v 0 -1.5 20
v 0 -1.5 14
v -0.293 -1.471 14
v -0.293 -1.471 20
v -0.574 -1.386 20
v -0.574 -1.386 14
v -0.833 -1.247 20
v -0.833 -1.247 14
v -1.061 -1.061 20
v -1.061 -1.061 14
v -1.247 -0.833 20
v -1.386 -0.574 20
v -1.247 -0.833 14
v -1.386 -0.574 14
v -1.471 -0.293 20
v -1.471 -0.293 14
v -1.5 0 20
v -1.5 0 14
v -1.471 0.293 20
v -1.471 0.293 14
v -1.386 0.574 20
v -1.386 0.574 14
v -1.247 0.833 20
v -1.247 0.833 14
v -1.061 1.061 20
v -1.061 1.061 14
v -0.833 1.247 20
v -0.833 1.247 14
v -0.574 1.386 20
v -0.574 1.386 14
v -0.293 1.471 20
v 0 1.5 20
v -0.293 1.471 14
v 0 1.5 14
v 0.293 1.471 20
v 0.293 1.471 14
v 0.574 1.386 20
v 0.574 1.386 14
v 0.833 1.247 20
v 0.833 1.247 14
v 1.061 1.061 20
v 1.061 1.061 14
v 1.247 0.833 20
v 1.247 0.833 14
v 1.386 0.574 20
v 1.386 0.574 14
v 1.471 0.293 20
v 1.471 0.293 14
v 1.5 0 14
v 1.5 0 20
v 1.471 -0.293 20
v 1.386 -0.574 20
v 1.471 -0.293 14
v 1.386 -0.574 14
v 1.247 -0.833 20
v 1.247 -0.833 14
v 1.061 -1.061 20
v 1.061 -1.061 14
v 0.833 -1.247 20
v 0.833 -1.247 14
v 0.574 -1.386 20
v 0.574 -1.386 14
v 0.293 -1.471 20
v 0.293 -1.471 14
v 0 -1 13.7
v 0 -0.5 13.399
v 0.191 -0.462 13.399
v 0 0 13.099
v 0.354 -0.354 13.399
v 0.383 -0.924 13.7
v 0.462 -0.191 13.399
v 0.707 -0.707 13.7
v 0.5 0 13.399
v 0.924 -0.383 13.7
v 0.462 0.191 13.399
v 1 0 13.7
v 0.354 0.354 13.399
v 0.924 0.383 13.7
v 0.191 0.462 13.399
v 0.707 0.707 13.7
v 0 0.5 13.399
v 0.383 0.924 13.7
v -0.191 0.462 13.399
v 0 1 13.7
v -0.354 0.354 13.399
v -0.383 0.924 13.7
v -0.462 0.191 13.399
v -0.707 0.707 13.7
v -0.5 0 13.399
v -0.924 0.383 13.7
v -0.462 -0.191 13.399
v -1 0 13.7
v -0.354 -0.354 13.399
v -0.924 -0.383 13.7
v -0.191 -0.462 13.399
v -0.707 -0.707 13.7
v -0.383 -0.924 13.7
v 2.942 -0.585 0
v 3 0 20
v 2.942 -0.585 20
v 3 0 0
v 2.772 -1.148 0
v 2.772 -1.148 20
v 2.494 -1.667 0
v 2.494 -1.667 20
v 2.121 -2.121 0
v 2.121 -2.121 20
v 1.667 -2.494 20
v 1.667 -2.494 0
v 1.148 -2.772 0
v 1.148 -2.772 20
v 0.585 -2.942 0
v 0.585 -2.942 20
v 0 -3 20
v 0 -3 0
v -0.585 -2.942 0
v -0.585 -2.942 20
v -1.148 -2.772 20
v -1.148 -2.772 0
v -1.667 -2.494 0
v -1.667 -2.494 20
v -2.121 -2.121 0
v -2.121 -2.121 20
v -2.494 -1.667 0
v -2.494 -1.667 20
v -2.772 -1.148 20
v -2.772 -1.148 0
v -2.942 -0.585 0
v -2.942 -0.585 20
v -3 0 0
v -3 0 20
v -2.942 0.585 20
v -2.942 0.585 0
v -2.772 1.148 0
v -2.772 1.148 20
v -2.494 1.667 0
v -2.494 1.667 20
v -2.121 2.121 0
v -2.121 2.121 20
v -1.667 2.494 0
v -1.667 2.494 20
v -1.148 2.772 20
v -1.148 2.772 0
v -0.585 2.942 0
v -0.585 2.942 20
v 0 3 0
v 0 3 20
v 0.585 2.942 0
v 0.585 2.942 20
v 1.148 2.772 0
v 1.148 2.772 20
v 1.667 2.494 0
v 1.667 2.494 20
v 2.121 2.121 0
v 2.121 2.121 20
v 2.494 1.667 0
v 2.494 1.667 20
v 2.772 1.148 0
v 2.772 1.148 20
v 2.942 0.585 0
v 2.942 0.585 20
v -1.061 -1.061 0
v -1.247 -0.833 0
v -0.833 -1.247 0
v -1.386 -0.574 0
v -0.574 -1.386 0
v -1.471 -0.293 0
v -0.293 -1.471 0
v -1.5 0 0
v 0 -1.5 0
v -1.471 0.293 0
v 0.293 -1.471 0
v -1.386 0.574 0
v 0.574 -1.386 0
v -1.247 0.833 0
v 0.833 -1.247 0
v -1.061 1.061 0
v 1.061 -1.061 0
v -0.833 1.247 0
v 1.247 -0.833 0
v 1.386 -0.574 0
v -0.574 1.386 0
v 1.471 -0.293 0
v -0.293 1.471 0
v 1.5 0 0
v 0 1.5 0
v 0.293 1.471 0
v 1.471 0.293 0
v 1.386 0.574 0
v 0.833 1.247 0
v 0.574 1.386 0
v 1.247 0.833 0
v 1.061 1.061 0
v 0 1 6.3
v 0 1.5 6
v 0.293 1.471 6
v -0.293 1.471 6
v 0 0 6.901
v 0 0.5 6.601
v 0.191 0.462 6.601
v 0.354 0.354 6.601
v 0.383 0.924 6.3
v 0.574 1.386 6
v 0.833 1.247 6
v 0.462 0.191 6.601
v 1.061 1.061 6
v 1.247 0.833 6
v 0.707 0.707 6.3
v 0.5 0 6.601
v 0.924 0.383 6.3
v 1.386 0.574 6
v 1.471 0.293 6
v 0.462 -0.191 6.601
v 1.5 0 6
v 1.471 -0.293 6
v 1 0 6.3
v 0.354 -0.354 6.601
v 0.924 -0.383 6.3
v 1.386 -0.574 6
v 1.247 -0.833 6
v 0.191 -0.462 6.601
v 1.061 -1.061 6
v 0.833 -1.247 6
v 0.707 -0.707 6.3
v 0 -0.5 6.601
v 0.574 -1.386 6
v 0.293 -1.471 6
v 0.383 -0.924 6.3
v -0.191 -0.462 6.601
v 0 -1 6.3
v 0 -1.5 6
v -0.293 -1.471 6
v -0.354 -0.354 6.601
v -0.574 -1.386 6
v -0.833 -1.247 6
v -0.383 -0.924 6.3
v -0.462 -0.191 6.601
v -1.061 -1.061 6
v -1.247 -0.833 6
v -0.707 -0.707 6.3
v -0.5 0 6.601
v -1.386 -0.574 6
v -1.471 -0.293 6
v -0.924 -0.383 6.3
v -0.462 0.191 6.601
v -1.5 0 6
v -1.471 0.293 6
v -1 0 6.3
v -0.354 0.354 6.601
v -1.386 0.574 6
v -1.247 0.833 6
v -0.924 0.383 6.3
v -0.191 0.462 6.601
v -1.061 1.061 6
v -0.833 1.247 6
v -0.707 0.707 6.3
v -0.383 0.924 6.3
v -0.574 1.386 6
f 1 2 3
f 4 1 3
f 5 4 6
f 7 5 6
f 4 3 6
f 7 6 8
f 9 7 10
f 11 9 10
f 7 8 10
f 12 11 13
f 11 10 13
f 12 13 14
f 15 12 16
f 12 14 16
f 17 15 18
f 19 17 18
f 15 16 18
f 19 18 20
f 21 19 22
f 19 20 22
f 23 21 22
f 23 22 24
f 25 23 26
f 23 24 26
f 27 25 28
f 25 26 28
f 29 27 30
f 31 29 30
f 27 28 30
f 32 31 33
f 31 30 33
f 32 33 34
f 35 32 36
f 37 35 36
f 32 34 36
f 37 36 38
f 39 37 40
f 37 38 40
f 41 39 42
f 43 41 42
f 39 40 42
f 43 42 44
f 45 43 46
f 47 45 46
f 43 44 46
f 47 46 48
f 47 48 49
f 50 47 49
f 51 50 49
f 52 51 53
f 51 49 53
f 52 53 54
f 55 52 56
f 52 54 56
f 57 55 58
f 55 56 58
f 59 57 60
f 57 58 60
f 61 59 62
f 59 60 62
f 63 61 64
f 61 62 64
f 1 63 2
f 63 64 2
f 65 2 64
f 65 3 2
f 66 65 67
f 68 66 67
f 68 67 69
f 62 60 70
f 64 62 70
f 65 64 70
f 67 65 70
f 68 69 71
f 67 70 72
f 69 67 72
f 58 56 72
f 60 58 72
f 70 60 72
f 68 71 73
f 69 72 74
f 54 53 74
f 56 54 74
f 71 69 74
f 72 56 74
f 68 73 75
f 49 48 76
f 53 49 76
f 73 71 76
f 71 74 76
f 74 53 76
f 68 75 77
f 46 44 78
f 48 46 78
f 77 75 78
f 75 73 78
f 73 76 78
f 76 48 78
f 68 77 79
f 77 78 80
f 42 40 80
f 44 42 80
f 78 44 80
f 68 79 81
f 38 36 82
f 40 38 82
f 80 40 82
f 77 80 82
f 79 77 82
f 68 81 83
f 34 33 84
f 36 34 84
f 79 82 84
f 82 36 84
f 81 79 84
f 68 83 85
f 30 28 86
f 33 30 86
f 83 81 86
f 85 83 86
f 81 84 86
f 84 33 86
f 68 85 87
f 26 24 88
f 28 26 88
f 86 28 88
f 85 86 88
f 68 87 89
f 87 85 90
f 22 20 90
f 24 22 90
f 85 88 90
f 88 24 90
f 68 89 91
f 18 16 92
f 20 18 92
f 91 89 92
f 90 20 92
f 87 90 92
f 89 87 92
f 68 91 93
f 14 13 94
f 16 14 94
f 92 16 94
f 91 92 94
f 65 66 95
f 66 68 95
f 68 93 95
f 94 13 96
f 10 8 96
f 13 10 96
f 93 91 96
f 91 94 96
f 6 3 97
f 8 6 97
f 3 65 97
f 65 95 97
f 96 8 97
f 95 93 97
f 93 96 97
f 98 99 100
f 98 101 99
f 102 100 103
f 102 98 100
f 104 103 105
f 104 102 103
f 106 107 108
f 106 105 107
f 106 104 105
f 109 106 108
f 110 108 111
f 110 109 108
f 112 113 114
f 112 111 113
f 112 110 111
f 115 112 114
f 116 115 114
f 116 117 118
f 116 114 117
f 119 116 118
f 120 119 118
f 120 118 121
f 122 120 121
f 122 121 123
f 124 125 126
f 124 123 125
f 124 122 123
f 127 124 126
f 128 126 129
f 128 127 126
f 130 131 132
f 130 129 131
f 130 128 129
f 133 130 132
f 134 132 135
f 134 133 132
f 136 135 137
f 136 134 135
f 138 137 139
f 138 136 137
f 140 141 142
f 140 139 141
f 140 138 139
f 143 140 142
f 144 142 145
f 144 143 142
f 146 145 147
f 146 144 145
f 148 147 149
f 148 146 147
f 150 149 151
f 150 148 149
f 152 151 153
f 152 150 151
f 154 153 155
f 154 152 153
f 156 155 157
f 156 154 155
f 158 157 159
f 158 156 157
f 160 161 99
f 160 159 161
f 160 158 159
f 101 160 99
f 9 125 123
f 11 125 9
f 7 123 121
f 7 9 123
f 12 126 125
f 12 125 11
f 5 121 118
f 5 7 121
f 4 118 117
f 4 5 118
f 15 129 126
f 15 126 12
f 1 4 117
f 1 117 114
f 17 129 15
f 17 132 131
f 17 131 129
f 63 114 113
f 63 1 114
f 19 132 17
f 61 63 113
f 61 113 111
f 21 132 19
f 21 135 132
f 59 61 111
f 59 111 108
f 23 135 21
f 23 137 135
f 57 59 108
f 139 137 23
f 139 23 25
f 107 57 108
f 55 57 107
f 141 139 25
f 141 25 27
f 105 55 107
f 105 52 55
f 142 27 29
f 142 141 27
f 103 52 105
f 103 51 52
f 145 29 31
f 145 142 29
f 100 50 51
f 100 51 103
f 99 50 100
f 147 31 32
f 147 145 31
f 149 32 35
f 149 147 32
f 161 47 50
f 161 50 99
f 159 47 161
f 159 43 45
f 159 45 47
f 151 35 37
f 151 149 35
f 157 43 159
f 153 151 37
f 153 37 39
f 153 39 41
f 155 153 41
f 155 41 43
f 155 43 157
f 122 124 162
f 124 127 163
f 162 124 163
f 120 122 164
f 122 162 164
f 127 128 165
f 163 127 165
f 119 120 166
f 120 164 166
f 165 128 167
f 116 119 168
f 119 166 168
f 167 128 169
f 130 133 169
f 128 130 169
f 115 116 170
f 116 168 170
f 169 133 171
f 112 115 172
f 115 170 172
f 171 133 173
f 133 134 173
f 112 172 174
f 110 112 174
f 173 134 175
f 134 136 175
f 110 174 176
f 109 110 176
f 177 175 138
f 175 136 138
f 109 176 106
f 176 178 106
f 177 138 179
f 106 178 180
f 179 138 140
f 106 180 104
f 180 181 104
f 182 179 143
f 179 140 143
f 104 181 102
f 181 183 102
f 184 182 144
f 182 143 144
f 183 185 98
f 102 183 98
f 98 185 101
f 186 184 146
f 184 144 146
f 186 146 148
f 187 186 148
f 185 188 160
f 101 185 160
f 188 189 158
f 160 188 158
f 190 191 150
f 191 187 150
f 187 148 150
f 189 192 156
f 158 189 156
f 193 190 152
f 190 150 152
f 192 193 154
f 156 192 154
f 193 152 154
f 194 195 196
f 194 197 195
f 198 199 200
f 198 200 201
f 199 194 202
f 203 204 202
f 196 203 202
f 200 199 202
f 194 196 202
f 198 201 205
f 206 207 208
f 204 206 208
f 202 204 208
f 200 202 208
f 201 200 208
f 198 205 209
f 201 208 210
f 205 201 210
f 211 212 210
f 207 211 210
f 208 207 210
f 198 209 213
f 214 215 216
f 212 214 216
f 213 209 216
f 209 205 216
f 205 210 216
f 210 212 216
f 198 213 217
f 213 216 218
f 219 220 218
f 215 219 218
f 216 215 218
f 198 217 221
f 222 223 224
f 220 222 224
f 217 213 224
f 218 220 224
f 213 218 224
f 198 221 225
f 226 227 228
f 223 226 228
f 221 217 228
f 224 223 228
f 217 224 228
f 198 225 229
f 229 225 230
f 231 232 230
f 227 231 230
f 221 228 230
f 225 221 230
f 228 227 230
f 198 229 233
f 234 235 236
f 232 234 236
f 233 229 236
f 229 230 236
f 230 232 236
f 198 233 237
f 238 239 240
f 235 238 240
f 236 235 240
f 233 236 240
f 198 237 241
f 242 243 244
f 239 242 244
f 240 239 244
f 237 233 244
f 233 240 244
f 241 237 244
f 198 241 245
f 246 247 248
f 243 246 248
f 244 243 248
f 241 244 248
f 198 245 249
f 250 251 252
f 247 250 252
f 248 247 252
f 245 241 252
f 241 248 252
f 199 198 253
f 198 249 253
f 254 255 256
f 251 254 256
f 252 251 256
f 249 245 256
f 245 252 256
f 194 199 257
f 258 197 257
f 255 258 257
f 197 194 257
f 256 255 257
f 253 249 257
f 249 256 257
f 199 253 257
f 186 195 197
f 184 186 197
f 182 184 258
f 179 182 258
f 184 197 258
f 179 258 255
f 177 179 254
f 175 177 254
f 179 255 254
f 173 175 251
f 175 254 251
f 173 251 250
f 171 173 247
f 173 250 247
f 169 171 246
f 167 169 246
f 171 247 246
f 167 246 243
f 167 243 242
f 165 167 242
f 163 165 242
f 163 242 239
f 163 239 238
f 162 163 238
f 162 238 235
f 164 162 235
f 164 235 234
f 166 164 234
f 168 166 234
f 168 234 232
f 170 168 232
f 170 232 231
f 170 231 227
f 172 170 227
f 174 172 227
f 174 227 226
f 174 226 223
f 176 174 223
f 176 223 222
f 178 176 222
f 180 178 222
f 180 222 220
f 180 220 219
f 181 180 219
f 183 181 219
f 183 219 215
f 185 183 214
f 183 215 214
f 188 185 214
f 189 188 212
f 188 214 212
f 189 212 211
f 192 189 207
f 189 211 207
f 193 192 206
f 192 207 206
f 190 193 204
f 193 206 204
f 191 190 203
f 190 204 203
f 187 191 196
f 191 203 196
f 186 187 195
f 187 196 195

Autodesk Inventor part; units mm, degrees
ref_plane "YZ Plane" through (0, 0, 0) normal (1, 0, 0) x (0, 1, 0)
ref_plane "XZ Plane" through (0, 0, 0) normal (0, 1, 0) x (-1, 0, 0)
ref_plane "XY Plane" through (0, 0, 0) normal (0, 0, 1) x (1, 0, 0)
sketch "スケッチ1" plane through (0, 0, 0) normal (0, 0, 1) x (1, 0, 0)
  circle A0 centre (0, 0) radius 3
  dimension "d0" = 6
extrude "押し出し1" add sketch "スケッチ1" along normal blind 20
hole "穴1" at (0, 0, 0) direction (0, 0, 1) diameter 3 depth 6 tip angle 118
sketch "スケッチ2" plane through (0, 0, 20) normal (0, 0, 1) x (1, 0, 0)
  circle A0 centre (0, 0) radius 3 projected
hole "穴2" at (0, 0, 20) direction (0, 0, -1) diameter 3 depth 6 tip angle 118
properties part number "スペーサ　m3-l20" material "アルミニウム 2014-T4"
